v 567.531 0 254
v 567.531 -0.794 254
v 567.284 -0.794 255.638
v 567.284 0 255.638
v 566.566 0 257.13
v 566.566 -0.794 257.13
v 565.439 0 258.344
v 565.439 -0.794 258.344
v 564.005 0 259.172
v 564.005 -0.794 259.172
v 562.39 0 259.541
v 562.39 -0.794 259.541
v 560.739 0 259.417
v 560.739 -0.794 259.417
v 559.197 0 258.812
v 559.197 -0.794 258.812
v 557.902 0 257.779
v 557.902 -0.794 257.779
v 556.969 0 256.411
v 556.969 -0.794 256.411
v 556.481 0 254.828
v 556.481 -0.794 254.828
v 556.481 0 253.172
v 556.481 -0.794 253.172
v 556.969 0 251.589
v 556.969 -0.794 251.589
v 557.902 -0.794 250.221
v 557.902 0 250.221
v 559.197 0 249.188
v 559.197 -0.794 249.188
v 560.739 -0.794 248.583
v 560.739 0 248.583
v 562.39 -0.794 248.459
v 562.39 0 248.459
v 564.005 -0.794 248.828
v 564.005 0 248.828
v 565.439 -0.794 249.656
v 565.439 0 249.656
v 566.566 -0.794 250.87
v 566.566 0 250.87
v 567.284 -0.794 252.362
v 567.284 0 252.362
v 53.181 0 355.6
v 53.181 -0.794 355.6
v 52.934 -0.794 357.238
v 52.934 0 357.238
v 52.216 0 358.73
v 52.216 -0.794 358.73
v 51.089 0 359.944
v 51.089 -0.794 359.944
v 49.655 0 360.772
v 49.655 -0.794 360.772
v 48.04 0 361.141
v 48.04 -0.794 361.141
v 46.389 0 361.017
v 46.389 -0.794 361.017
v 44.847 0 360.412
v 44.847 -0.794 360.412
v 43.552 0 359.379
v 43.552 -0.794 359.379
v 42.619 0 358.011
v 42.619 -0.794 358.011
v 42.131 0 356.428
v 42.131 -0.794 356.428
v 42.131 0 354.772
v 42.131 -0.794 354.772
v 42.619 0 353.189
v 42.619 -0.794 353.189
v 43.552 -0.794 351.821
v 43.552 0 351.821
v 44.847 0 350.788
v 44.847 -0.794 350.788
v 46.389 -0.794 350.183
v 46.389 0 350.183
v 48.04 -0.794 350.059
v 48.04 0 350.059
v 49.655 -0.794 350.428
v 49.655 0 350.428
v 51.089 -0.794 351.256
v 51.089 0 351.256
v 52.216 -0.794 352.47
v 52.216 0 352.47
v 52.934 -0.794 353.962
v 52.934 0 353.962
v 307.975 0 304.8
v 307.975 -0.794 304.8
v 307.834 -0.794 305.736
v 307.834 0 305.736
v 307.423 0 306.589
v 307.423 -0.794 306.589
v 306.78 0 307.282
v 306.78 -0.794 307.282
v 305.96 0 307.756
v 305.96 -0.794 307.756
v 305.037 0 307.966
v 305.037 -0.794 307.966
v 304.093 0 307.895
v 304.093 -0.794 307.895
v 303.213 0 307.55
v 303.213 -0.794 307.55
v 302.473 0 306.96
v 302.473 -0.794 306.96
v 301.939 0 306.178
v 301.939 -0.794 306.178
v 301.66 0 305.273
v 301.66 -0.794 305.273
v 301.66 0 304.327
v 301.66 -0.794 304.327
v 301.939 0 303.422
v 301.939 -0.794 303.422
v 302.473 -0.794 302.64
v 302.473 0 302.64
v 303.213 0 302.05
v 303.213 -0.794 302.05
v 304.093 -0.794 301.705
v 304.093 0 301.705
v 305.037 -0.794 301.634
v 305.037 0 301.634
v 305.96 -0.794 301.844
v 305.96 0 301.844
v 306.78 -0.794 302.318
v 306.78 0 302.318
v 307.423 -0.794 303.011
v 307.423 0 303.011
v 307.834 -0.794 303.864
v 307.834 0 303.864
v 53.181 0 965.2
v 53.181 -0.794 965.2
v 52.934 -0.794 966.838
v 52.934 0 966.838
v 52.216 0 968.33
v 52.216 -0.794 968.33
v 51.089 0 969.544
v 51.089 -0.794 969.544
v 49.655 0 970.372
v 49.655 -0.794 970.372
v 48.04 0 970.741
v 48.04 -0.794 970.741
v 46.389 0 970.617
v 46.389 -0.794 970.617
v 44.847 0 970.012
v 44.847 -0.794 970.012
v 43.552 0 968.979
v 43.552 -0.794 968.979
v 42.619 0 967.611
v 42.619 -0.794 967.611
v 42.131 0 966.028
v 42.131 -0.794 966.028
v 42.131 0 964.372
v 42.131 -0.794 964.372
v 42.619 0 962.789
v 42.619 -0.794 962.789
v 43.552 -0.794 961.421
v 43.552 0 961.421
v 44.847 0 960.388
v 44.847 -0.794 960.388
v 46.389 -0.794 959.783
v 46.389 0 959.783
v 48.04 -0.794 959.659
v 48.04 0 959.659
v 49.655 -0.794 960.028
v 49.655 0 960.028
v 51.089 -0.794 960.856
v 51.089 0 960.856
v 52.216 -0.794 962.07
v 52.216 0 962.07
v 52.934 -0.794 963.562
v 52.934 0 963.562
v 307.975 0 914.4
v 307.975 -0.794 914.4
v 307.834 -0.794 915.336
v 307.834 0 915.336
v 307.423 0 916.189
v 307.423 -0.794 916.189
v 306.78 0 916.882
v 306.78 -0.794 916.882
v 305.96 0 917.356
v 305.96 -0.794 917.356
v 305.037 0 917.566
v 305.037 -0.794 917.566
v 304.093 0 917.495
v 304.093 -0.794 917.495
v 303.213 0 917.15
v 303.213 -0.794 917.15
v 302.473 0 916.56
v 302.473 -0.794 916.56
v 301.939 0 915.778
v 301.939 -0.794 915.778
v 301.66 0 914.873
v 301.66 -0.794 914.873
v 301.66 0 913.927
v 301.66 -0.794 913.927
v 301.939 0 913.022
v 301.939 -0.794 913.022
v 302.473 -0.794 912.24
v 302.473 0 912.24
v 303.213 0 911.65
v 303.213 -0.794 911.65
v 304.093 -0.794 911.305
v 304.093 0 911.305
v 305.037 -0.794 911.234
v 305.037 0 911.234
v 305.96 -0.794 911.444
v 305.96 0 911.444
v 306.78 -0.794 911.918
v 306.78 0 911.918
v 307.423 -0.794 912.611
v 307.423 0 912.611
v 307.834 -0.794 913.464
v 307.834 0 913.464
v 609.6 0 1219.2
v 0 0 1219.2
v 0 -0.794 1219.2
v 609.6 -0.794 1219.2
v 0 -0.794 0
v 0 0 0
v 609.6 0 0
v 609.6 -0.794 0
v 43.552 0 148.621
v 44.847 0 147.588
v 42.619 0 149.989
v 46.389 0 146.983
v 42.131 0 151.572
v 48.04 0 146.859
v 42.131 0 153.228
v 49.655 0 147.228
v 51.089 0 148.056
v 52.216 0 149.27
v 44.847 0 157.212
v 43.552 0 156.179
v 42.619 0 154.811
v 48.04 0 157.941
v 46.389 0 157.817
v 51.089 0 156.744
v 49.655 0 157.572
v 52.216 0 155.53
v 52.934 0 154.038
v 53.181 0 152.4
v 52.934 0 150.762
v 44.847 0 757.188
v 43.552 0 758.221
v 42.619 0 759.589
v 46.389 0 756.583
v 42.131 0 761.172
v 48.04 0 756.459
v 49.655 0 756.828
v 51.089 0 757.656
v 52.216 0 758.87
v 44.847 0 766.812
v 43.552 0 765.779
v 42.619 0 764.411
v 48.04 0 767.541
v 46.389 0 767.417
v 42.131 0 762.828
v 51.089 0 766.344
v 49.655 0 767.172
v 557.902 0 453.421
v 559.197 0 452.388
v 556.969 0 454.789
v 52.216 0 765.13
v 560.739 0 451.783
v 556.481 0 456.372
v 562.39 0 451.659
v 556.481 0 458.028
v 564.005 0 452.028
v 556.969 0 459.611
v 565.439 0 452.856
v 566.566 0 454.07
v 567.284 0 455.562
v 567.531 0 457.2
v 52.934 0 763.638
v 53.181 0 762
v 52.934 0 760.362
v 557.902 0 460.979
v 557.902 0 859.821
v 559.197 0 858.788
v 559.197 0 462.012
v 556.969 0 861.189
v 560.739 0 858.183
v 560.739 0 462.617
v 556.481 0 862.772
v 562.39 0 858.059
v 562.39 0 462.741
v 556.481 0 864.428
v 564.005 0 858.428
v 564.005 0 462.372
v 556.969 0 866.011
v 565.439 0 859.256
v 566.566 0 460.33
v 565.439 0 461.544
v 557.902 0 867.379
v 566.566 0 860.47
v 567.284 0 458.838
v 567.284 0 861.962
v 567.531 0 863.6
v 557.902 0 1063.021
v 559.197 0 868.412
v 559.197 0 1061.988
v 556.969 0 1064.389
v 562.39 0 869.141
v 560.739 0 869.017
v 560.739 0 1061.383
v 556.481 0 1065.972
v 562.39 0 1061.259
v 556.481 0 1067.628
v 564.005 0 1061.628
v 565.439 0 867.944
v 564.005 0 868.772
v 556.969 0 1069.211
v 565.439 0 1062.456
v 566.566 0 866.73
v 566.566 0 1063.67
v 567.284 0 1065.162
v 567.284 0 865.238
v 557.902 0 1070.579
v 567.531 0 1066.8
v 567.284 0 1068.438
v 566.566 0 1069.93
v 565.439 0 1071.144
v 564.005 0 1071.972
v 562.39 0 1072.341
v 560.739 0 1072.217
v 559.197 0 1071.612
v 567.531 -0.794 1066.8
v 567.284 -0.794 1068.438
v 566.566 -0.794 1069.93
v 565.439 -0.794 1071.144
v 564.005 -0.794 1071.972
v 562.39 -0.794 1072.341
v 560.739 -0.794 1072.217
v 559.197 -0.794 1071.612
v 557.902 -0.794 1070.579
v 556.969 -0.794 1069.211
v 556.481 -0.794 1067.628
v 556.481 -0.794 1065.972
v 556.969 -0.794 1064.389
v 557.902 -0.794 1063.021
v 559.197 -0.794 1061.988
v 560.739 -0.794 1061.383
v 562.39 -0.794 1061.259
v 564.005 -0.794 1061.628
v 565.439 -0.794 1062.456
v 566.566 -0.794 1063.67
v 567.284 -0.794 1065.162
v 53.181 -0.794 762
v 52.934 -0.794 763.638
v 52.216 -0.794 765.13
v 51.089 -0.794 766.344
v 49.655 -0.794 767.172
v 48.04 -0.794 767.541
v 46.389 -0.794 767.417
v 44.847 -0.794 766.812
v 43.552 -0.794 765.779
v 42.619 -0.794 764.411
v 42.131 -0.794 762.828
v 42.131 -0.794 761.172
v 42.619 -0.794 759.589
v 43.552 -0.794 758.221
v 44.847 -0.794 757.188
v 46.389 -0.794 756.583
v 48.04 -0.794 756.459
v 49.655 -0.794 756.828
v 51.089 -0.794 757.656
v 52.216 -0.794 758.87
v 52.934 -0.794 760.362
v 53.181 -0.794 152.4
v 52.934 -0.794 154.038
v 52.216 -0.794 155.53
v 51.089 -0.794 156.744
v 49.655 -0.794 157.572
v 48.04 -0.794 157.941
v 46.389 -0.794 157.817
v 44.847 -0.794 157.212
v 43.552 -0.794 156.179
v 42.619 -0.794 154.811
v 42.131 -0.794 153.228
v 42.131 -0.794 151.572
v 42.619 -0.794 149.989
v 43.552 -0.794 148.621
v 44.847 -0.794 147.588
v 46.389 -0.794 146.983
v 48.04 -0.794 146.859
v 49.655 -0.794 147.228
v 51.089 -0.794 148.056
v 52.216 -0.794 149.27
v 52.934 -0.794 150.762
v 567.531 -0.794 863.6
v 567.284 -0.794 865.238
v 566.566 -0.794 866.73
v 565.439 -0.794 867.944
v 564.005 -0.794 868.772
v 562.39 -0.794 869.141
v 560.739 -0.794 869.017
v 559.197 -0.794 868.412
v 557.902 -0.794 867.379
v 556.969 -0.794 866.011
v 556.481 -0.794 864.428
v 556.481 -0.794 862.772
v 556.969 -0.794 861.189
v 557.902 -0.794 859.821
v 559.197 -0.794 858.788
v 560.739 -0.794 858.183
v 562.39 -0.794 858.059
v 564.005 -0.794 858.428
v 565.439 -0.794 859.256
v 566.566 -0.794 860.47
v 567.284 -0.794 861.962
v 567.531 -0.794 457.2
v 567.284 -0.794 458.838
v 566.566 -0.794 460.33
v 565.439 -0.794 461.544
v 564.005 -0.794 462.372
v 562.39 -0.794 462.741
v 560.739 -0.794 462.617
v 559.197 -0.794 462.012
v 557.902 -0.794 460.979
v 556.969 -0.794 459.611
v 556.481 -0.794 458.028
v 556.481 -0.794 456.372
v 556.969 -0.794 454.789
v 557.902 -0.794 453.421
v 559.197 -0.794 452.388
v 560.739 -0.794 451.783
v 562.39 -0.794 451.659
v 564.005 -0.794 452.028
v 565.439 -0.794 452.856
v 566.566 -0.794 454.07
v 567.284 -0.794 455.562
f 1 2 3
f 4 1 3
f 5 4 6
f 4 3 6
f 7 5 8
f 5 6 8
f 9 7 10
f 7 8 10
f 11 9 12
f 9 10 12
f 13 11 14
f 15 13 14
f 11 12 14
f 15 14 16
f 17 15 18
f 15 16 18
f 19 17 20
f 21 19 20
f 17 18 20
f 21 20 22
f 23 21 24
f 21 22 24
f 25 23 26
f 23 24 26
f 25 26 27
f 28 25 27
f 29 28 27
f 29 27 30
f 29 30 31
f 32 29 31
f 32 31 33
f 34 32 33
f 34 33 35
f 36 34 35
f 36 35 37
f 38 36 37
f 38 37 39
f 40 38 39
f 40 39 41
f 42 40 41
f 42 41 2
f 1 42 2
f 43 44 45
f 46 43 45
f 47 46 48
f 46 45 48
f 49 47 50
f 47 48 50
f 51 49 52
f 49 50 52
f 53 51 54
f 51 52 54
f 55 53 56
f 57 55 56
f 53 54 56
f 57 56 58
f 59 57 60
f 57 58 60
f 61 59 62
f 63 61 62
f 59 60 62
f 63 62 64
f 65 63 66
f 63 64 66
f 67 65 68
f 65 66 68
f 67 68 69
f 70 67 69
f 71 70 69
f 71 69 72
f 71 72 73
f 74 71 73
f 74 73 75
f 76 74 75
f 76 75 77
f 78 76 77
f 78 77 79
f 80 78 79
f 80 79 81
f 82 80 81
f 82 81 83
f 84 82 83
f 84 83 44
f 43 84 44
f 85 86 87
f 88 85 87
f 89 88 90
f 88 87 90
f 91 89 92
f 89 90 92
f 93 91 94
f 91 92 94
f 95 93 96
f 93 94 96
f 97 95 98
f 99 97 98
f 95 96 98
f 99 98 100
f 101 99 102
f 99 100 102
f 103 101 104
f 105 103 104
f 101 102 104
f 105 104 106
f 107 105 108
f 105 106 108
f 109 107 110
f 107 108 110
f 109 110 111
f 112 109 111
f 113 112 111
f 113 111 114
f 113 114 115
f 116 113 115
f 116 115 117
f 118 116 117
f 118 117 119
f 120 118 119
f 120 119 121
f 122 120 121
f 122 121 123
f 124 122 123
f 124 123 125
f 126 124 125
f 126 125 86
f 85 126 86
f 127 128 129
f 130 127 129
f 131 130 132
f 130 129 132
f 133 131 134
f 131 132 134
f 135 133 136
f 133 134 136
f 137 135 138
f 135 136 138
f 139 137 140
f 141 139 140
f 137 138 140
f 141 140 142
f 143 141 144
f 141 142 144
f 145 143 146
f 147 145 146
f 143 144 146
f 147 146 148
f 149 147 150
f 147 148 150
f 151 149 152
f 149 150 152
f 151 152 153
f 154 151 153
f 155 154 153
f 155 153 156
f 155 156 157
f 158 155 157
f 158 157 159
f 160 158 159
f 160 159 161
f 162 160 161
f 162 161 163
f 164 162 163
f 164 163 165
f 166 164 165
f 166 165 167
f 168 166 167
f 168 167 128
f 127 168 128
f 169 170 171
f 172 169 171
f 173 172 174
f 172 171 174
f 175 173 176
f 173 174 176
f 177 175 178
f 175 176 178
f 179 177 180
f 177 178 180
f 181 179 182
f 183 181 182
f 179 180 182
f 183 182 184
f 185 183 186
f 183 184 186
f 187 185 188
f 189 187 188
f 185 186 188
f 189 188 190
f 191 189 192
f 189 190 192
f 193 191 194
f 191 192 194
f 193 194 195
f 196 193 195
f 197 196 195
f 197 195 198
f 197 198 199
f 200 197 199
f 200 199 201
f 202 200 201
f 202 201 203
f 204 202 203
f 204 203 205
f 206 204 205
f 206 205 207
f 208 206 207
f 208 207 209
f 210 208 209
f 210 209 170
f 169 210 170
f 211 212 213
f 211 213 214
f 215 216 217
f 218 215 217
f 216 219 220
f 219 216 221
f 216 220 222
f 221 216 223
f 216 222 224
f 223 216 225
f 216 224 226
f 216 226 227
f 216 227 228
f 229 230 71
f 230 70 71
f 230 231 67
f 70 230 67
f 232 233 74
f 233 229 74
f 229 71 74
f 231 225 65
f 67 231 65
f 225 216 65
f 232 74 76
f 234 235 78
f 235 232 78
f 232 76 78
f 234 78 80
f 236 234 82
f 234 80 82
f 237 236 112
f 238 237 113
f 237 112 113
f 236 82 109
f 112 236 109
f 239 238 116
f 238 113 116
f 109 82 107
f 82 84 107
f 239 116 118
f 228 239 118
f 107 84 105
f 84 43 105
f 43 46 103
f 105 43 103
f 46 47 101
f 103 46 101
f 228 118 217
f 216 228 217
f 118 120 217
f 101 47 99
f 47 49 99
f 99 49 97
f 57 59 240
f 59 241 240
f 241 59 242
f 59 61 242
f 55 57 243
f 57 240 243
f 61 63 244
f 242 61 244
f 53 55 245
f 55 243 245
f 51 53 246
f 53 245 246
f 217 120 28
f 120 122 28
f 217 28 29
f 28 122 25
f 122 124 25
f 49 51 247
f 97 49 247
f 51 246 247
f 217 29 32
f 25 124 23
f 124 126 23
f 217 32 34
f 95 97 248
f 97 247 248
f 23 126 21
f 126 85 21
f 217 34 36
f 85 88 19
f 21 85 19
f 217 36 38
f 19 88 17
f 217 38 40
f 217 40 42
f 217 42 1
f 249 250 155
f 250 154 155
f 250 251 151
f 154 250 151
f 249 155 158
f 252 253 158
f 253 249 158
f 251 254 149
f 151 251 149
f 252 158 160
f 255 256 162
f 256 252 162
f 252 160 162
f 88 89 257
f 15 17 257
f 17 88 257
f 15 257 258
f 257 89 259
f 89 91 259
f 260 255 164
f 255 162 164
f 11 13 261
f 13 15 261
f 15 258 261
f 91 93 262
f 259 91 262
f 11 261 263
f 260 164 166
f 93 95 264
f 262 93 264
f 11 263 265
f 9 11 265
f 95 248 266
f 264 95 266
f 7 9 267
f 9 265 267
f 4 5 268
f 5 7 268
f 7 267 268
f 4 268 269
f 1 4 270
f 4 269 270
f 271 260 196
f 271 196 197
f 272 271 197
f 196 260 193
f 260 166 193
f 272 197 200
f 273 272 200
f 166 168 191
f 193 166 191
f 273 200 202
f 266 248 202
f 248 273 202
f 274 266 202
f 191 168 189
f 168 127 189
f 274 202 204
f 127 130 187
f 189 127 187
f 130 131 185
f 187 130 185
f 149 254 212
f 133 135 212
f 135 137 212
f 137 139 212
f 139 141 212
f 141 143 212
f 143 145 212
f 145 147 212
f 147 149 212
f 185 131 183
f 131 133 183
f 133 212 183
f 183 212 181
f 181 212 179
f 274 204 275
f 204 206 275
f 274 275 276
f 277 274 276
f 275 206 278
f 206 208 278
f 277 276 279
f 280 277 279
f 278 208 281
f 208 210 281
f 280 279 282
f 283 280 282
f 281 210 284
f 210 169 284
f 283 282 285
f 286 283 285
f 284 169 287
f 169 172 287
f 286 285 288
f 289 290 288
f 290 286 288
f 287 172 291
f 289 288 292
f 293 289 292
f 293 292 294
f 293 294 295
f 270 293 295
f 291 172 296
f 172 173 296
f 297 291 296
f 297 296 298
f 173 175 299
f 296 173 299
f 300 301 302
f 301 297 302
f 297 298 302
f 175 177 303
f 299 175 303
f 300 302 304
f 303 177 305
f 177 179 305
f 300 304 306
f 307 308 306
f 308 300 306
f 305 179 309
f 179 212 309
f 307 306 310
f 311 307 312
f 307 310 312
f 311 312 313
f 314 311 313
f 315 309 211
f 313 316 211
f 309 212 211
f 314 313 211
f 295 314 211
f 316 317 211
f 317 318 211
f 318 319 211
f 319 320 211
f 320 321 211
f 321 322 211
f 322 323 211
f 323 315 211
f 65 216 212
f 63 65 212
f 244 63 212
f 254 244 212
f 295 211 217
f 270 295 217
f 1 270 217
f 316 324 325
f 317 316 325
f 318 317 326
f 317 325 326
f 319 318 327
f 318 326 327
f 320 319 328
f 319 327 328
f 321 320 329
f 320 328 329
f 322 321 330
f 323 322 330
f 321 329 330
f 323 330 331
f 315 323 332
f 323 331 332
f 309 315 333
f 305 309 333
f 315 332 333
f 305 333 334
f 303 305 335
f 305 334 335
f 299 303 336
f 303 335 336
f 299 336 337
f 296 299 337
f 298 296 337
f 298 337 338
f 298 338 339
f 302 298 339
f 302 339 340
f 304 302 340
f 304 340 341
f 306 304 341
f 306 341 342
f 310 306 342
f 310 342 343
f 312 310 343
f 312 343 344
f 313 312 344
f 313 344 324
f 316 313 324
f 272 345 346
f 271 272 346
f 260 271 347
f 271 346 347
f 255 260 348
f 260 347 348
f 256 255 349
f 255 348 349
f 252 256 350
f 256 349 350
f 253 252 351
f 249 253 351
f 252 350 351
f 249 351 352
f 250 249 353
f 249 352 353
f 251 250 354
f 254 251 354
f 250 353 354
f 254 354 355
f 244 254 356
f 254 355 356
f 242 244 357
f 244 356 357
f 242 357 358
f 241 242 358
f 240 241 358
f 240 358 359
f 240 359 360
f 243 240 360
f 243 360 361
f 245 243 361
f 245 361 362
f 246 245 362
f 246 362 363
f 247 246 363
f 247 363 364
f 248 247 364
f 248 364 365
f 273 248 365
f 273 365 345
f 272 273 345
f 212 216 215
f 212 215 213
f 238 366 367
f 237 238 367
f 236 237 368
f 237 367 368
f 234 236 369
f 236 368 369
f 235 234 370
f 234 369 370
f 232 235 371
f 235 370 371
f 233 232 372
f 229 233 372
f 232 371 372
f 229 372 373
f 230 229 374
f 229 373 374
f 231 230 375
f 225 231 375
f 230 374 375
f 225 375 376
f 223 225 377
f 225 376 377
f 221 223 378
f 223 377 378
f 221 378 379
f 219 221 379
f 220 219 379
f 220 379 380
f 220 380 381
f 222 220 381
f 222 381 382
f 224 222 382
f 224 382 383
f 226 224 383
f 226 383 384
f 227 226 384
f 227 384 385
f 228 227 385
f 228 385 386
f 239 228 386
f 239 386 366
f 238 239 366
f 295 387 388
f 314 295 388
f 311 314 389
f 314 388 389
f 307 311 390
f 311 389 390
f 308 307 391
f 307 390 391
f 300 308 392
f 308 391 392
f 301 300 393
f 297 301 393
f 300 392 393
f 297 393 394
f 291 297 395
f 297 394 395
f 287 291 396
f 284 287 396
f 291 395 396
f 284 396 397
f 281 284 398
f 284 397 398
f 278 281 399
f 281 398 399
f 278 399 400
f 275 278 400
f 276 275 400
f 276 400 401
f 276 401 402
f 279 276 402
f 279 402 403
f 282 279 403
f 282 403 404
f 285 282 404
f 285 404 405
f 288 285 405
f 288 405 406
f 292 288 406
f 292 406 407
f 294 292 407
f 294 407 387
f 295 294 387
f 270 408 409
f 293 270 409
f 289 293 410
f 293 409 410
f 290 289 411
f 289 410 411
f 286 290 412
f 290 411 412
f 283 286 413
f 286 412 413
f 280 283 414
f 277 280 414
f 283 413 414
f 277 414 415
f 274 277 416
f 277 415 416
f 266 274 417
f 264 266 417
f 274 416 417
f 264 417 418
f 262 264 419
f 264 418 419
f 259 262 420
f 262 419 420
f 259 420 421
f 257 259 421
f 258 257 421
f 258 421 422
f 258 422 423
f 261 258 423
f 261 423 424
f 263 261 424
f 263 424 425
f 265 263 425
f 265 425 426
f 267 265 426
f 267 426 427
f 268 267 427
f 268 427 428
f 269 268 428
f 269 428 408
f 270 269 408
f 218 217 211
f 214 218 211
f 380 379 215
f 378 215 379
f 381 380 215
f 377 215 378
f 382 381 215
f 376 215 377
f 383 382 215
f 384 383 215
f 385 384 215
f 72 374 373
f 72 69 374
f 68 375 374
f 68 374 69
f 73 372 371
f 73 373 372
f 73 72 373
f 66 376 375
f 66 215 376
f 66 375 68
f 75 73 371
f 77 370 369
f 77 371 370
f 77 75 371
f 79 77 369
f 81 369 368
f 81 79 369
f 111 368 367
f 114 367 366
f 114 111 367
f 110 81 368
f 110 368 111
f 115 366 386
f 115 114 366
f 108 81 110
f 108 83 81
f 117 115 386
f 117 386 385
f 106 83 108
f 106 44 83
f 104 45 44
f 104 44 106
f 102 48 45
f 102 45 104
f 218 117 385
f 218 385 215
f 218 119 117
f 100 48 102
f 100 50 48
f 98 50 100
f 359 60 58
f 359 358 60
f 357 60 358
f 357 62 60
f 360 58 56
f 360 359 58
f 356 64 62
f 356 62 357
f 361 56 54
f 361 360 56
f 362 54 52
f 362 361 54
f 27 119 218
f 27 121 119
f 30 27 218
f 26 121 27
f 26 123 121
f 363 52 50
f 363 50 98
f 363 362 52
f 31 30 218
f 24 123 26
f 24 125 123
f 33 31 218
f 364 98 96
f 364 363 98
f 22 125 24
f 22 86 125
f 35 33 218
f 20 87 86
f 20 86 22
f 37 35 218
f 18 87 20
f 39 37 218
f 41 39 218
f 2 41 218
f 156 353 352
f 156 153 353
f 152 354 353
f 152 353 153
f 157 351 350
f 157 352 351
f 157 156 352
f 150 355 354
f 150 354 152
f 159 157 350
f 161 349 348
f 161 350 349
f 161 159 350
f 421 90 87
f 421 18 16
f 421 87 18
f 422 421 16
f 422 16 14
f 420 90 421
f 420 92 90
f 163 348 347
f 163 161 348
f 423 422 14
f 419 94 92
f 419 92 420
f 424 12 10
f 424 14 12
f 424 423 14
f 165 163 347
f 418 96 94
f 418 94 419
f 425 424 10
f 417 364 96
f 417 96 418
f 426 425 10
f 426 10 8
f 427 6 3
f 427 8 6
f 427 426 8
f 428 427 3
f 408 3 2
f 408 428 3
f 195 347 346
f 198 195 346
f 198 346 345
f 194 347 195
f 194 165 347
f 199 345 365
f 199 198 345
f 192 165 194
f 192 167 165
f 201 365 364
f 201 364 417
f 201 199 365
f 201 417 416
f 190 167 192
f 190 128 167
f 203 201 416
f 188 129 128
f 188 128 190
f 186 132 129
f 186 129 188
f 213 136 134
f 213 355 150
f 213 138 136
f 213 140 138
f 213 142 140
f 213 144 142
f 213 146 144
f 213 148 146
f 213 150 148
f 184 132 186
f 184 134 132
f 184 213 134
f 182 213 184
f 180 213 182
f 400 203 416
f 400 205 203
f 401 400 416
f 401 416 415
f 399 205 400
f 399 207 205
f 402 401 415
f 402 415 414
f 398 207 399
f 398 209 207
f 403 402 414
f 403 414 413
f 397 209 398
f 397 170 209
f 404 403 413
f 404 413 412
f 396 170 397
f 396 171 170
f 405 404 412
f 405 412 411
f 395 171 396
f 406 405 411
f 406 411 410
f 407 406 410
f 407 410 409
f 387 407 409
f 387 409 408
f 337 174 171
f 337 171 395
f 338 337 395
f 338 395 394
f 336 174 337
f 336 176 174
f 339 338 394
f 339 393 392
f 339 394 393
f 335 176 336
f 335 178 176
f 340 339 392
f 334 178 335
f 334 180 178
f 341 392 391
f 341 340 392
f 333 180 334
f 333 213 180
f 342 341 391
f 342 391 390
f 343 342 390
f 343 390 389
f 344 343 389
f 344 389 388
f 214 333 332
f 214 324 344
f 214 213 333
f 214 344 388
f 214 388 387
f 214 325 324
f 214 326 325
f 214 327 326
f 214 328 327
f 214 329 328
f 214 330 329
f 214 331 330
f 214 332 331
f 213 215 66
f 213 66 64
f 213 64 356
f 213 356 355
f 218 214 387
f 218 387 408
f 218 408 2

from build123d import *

# Parameters (mm, degrees)
F0_W     = 609.6
F0_H     = 1219.2
F1_DEPTH = 0.79375
F2_R     = 5.55625
F3_DEPTH = 25.4
F4_R     = 3.175
F5_DEPTH = 25.4


with BuildPart() as f1:
    # F0 (on Front) → F1 (new body)
    with BuildSketch(Plane.XZ):
        with Locations((304.8, 609.6)):
            Rectangle(F0_W, F0_H)
    extrude(amount=F1_DEPTH)

    # F2 (on face) → F3 (cut)
    with BuildSketch(Plane.XZ.offset(0.79375)):
        with Locations((47.625, 355.6)):
            Circle(F2_R)
        with Locations((47.625, 152.4)):
            Circle(F2_R)
        with Locations((561.975, 863.6)):
            Circle(F2_R)
        with Locations((561.975, 1066.8)):
            Circle(F2_R)
        with Locations((561.975, 254)):
            Circle(F2_R)
        with Locations((561.975, 457.2)):
            Circle(F2_R)
        with Locations((47.625, 965.2)):
            Circle(F2_R)
        with Locations((47.625, 762)):
            Circle(F2_R)
    extrude(amount=-F3_DEPTH, mode=Mode.SUBTRACT)

    # F4 (on face) → F5 (cut)
    with BuildSketch(Plane.XZ.offset(0.79375)):
        with Locations((304.8, 304.8)):
            Circle(F4_R)
        with Locations((304.8, 914.4)):
            Circle(F4_R)
    extrude(amount=-F5_DEPTH, mode=Mode.SUBTRACT)


solid = f1.part
